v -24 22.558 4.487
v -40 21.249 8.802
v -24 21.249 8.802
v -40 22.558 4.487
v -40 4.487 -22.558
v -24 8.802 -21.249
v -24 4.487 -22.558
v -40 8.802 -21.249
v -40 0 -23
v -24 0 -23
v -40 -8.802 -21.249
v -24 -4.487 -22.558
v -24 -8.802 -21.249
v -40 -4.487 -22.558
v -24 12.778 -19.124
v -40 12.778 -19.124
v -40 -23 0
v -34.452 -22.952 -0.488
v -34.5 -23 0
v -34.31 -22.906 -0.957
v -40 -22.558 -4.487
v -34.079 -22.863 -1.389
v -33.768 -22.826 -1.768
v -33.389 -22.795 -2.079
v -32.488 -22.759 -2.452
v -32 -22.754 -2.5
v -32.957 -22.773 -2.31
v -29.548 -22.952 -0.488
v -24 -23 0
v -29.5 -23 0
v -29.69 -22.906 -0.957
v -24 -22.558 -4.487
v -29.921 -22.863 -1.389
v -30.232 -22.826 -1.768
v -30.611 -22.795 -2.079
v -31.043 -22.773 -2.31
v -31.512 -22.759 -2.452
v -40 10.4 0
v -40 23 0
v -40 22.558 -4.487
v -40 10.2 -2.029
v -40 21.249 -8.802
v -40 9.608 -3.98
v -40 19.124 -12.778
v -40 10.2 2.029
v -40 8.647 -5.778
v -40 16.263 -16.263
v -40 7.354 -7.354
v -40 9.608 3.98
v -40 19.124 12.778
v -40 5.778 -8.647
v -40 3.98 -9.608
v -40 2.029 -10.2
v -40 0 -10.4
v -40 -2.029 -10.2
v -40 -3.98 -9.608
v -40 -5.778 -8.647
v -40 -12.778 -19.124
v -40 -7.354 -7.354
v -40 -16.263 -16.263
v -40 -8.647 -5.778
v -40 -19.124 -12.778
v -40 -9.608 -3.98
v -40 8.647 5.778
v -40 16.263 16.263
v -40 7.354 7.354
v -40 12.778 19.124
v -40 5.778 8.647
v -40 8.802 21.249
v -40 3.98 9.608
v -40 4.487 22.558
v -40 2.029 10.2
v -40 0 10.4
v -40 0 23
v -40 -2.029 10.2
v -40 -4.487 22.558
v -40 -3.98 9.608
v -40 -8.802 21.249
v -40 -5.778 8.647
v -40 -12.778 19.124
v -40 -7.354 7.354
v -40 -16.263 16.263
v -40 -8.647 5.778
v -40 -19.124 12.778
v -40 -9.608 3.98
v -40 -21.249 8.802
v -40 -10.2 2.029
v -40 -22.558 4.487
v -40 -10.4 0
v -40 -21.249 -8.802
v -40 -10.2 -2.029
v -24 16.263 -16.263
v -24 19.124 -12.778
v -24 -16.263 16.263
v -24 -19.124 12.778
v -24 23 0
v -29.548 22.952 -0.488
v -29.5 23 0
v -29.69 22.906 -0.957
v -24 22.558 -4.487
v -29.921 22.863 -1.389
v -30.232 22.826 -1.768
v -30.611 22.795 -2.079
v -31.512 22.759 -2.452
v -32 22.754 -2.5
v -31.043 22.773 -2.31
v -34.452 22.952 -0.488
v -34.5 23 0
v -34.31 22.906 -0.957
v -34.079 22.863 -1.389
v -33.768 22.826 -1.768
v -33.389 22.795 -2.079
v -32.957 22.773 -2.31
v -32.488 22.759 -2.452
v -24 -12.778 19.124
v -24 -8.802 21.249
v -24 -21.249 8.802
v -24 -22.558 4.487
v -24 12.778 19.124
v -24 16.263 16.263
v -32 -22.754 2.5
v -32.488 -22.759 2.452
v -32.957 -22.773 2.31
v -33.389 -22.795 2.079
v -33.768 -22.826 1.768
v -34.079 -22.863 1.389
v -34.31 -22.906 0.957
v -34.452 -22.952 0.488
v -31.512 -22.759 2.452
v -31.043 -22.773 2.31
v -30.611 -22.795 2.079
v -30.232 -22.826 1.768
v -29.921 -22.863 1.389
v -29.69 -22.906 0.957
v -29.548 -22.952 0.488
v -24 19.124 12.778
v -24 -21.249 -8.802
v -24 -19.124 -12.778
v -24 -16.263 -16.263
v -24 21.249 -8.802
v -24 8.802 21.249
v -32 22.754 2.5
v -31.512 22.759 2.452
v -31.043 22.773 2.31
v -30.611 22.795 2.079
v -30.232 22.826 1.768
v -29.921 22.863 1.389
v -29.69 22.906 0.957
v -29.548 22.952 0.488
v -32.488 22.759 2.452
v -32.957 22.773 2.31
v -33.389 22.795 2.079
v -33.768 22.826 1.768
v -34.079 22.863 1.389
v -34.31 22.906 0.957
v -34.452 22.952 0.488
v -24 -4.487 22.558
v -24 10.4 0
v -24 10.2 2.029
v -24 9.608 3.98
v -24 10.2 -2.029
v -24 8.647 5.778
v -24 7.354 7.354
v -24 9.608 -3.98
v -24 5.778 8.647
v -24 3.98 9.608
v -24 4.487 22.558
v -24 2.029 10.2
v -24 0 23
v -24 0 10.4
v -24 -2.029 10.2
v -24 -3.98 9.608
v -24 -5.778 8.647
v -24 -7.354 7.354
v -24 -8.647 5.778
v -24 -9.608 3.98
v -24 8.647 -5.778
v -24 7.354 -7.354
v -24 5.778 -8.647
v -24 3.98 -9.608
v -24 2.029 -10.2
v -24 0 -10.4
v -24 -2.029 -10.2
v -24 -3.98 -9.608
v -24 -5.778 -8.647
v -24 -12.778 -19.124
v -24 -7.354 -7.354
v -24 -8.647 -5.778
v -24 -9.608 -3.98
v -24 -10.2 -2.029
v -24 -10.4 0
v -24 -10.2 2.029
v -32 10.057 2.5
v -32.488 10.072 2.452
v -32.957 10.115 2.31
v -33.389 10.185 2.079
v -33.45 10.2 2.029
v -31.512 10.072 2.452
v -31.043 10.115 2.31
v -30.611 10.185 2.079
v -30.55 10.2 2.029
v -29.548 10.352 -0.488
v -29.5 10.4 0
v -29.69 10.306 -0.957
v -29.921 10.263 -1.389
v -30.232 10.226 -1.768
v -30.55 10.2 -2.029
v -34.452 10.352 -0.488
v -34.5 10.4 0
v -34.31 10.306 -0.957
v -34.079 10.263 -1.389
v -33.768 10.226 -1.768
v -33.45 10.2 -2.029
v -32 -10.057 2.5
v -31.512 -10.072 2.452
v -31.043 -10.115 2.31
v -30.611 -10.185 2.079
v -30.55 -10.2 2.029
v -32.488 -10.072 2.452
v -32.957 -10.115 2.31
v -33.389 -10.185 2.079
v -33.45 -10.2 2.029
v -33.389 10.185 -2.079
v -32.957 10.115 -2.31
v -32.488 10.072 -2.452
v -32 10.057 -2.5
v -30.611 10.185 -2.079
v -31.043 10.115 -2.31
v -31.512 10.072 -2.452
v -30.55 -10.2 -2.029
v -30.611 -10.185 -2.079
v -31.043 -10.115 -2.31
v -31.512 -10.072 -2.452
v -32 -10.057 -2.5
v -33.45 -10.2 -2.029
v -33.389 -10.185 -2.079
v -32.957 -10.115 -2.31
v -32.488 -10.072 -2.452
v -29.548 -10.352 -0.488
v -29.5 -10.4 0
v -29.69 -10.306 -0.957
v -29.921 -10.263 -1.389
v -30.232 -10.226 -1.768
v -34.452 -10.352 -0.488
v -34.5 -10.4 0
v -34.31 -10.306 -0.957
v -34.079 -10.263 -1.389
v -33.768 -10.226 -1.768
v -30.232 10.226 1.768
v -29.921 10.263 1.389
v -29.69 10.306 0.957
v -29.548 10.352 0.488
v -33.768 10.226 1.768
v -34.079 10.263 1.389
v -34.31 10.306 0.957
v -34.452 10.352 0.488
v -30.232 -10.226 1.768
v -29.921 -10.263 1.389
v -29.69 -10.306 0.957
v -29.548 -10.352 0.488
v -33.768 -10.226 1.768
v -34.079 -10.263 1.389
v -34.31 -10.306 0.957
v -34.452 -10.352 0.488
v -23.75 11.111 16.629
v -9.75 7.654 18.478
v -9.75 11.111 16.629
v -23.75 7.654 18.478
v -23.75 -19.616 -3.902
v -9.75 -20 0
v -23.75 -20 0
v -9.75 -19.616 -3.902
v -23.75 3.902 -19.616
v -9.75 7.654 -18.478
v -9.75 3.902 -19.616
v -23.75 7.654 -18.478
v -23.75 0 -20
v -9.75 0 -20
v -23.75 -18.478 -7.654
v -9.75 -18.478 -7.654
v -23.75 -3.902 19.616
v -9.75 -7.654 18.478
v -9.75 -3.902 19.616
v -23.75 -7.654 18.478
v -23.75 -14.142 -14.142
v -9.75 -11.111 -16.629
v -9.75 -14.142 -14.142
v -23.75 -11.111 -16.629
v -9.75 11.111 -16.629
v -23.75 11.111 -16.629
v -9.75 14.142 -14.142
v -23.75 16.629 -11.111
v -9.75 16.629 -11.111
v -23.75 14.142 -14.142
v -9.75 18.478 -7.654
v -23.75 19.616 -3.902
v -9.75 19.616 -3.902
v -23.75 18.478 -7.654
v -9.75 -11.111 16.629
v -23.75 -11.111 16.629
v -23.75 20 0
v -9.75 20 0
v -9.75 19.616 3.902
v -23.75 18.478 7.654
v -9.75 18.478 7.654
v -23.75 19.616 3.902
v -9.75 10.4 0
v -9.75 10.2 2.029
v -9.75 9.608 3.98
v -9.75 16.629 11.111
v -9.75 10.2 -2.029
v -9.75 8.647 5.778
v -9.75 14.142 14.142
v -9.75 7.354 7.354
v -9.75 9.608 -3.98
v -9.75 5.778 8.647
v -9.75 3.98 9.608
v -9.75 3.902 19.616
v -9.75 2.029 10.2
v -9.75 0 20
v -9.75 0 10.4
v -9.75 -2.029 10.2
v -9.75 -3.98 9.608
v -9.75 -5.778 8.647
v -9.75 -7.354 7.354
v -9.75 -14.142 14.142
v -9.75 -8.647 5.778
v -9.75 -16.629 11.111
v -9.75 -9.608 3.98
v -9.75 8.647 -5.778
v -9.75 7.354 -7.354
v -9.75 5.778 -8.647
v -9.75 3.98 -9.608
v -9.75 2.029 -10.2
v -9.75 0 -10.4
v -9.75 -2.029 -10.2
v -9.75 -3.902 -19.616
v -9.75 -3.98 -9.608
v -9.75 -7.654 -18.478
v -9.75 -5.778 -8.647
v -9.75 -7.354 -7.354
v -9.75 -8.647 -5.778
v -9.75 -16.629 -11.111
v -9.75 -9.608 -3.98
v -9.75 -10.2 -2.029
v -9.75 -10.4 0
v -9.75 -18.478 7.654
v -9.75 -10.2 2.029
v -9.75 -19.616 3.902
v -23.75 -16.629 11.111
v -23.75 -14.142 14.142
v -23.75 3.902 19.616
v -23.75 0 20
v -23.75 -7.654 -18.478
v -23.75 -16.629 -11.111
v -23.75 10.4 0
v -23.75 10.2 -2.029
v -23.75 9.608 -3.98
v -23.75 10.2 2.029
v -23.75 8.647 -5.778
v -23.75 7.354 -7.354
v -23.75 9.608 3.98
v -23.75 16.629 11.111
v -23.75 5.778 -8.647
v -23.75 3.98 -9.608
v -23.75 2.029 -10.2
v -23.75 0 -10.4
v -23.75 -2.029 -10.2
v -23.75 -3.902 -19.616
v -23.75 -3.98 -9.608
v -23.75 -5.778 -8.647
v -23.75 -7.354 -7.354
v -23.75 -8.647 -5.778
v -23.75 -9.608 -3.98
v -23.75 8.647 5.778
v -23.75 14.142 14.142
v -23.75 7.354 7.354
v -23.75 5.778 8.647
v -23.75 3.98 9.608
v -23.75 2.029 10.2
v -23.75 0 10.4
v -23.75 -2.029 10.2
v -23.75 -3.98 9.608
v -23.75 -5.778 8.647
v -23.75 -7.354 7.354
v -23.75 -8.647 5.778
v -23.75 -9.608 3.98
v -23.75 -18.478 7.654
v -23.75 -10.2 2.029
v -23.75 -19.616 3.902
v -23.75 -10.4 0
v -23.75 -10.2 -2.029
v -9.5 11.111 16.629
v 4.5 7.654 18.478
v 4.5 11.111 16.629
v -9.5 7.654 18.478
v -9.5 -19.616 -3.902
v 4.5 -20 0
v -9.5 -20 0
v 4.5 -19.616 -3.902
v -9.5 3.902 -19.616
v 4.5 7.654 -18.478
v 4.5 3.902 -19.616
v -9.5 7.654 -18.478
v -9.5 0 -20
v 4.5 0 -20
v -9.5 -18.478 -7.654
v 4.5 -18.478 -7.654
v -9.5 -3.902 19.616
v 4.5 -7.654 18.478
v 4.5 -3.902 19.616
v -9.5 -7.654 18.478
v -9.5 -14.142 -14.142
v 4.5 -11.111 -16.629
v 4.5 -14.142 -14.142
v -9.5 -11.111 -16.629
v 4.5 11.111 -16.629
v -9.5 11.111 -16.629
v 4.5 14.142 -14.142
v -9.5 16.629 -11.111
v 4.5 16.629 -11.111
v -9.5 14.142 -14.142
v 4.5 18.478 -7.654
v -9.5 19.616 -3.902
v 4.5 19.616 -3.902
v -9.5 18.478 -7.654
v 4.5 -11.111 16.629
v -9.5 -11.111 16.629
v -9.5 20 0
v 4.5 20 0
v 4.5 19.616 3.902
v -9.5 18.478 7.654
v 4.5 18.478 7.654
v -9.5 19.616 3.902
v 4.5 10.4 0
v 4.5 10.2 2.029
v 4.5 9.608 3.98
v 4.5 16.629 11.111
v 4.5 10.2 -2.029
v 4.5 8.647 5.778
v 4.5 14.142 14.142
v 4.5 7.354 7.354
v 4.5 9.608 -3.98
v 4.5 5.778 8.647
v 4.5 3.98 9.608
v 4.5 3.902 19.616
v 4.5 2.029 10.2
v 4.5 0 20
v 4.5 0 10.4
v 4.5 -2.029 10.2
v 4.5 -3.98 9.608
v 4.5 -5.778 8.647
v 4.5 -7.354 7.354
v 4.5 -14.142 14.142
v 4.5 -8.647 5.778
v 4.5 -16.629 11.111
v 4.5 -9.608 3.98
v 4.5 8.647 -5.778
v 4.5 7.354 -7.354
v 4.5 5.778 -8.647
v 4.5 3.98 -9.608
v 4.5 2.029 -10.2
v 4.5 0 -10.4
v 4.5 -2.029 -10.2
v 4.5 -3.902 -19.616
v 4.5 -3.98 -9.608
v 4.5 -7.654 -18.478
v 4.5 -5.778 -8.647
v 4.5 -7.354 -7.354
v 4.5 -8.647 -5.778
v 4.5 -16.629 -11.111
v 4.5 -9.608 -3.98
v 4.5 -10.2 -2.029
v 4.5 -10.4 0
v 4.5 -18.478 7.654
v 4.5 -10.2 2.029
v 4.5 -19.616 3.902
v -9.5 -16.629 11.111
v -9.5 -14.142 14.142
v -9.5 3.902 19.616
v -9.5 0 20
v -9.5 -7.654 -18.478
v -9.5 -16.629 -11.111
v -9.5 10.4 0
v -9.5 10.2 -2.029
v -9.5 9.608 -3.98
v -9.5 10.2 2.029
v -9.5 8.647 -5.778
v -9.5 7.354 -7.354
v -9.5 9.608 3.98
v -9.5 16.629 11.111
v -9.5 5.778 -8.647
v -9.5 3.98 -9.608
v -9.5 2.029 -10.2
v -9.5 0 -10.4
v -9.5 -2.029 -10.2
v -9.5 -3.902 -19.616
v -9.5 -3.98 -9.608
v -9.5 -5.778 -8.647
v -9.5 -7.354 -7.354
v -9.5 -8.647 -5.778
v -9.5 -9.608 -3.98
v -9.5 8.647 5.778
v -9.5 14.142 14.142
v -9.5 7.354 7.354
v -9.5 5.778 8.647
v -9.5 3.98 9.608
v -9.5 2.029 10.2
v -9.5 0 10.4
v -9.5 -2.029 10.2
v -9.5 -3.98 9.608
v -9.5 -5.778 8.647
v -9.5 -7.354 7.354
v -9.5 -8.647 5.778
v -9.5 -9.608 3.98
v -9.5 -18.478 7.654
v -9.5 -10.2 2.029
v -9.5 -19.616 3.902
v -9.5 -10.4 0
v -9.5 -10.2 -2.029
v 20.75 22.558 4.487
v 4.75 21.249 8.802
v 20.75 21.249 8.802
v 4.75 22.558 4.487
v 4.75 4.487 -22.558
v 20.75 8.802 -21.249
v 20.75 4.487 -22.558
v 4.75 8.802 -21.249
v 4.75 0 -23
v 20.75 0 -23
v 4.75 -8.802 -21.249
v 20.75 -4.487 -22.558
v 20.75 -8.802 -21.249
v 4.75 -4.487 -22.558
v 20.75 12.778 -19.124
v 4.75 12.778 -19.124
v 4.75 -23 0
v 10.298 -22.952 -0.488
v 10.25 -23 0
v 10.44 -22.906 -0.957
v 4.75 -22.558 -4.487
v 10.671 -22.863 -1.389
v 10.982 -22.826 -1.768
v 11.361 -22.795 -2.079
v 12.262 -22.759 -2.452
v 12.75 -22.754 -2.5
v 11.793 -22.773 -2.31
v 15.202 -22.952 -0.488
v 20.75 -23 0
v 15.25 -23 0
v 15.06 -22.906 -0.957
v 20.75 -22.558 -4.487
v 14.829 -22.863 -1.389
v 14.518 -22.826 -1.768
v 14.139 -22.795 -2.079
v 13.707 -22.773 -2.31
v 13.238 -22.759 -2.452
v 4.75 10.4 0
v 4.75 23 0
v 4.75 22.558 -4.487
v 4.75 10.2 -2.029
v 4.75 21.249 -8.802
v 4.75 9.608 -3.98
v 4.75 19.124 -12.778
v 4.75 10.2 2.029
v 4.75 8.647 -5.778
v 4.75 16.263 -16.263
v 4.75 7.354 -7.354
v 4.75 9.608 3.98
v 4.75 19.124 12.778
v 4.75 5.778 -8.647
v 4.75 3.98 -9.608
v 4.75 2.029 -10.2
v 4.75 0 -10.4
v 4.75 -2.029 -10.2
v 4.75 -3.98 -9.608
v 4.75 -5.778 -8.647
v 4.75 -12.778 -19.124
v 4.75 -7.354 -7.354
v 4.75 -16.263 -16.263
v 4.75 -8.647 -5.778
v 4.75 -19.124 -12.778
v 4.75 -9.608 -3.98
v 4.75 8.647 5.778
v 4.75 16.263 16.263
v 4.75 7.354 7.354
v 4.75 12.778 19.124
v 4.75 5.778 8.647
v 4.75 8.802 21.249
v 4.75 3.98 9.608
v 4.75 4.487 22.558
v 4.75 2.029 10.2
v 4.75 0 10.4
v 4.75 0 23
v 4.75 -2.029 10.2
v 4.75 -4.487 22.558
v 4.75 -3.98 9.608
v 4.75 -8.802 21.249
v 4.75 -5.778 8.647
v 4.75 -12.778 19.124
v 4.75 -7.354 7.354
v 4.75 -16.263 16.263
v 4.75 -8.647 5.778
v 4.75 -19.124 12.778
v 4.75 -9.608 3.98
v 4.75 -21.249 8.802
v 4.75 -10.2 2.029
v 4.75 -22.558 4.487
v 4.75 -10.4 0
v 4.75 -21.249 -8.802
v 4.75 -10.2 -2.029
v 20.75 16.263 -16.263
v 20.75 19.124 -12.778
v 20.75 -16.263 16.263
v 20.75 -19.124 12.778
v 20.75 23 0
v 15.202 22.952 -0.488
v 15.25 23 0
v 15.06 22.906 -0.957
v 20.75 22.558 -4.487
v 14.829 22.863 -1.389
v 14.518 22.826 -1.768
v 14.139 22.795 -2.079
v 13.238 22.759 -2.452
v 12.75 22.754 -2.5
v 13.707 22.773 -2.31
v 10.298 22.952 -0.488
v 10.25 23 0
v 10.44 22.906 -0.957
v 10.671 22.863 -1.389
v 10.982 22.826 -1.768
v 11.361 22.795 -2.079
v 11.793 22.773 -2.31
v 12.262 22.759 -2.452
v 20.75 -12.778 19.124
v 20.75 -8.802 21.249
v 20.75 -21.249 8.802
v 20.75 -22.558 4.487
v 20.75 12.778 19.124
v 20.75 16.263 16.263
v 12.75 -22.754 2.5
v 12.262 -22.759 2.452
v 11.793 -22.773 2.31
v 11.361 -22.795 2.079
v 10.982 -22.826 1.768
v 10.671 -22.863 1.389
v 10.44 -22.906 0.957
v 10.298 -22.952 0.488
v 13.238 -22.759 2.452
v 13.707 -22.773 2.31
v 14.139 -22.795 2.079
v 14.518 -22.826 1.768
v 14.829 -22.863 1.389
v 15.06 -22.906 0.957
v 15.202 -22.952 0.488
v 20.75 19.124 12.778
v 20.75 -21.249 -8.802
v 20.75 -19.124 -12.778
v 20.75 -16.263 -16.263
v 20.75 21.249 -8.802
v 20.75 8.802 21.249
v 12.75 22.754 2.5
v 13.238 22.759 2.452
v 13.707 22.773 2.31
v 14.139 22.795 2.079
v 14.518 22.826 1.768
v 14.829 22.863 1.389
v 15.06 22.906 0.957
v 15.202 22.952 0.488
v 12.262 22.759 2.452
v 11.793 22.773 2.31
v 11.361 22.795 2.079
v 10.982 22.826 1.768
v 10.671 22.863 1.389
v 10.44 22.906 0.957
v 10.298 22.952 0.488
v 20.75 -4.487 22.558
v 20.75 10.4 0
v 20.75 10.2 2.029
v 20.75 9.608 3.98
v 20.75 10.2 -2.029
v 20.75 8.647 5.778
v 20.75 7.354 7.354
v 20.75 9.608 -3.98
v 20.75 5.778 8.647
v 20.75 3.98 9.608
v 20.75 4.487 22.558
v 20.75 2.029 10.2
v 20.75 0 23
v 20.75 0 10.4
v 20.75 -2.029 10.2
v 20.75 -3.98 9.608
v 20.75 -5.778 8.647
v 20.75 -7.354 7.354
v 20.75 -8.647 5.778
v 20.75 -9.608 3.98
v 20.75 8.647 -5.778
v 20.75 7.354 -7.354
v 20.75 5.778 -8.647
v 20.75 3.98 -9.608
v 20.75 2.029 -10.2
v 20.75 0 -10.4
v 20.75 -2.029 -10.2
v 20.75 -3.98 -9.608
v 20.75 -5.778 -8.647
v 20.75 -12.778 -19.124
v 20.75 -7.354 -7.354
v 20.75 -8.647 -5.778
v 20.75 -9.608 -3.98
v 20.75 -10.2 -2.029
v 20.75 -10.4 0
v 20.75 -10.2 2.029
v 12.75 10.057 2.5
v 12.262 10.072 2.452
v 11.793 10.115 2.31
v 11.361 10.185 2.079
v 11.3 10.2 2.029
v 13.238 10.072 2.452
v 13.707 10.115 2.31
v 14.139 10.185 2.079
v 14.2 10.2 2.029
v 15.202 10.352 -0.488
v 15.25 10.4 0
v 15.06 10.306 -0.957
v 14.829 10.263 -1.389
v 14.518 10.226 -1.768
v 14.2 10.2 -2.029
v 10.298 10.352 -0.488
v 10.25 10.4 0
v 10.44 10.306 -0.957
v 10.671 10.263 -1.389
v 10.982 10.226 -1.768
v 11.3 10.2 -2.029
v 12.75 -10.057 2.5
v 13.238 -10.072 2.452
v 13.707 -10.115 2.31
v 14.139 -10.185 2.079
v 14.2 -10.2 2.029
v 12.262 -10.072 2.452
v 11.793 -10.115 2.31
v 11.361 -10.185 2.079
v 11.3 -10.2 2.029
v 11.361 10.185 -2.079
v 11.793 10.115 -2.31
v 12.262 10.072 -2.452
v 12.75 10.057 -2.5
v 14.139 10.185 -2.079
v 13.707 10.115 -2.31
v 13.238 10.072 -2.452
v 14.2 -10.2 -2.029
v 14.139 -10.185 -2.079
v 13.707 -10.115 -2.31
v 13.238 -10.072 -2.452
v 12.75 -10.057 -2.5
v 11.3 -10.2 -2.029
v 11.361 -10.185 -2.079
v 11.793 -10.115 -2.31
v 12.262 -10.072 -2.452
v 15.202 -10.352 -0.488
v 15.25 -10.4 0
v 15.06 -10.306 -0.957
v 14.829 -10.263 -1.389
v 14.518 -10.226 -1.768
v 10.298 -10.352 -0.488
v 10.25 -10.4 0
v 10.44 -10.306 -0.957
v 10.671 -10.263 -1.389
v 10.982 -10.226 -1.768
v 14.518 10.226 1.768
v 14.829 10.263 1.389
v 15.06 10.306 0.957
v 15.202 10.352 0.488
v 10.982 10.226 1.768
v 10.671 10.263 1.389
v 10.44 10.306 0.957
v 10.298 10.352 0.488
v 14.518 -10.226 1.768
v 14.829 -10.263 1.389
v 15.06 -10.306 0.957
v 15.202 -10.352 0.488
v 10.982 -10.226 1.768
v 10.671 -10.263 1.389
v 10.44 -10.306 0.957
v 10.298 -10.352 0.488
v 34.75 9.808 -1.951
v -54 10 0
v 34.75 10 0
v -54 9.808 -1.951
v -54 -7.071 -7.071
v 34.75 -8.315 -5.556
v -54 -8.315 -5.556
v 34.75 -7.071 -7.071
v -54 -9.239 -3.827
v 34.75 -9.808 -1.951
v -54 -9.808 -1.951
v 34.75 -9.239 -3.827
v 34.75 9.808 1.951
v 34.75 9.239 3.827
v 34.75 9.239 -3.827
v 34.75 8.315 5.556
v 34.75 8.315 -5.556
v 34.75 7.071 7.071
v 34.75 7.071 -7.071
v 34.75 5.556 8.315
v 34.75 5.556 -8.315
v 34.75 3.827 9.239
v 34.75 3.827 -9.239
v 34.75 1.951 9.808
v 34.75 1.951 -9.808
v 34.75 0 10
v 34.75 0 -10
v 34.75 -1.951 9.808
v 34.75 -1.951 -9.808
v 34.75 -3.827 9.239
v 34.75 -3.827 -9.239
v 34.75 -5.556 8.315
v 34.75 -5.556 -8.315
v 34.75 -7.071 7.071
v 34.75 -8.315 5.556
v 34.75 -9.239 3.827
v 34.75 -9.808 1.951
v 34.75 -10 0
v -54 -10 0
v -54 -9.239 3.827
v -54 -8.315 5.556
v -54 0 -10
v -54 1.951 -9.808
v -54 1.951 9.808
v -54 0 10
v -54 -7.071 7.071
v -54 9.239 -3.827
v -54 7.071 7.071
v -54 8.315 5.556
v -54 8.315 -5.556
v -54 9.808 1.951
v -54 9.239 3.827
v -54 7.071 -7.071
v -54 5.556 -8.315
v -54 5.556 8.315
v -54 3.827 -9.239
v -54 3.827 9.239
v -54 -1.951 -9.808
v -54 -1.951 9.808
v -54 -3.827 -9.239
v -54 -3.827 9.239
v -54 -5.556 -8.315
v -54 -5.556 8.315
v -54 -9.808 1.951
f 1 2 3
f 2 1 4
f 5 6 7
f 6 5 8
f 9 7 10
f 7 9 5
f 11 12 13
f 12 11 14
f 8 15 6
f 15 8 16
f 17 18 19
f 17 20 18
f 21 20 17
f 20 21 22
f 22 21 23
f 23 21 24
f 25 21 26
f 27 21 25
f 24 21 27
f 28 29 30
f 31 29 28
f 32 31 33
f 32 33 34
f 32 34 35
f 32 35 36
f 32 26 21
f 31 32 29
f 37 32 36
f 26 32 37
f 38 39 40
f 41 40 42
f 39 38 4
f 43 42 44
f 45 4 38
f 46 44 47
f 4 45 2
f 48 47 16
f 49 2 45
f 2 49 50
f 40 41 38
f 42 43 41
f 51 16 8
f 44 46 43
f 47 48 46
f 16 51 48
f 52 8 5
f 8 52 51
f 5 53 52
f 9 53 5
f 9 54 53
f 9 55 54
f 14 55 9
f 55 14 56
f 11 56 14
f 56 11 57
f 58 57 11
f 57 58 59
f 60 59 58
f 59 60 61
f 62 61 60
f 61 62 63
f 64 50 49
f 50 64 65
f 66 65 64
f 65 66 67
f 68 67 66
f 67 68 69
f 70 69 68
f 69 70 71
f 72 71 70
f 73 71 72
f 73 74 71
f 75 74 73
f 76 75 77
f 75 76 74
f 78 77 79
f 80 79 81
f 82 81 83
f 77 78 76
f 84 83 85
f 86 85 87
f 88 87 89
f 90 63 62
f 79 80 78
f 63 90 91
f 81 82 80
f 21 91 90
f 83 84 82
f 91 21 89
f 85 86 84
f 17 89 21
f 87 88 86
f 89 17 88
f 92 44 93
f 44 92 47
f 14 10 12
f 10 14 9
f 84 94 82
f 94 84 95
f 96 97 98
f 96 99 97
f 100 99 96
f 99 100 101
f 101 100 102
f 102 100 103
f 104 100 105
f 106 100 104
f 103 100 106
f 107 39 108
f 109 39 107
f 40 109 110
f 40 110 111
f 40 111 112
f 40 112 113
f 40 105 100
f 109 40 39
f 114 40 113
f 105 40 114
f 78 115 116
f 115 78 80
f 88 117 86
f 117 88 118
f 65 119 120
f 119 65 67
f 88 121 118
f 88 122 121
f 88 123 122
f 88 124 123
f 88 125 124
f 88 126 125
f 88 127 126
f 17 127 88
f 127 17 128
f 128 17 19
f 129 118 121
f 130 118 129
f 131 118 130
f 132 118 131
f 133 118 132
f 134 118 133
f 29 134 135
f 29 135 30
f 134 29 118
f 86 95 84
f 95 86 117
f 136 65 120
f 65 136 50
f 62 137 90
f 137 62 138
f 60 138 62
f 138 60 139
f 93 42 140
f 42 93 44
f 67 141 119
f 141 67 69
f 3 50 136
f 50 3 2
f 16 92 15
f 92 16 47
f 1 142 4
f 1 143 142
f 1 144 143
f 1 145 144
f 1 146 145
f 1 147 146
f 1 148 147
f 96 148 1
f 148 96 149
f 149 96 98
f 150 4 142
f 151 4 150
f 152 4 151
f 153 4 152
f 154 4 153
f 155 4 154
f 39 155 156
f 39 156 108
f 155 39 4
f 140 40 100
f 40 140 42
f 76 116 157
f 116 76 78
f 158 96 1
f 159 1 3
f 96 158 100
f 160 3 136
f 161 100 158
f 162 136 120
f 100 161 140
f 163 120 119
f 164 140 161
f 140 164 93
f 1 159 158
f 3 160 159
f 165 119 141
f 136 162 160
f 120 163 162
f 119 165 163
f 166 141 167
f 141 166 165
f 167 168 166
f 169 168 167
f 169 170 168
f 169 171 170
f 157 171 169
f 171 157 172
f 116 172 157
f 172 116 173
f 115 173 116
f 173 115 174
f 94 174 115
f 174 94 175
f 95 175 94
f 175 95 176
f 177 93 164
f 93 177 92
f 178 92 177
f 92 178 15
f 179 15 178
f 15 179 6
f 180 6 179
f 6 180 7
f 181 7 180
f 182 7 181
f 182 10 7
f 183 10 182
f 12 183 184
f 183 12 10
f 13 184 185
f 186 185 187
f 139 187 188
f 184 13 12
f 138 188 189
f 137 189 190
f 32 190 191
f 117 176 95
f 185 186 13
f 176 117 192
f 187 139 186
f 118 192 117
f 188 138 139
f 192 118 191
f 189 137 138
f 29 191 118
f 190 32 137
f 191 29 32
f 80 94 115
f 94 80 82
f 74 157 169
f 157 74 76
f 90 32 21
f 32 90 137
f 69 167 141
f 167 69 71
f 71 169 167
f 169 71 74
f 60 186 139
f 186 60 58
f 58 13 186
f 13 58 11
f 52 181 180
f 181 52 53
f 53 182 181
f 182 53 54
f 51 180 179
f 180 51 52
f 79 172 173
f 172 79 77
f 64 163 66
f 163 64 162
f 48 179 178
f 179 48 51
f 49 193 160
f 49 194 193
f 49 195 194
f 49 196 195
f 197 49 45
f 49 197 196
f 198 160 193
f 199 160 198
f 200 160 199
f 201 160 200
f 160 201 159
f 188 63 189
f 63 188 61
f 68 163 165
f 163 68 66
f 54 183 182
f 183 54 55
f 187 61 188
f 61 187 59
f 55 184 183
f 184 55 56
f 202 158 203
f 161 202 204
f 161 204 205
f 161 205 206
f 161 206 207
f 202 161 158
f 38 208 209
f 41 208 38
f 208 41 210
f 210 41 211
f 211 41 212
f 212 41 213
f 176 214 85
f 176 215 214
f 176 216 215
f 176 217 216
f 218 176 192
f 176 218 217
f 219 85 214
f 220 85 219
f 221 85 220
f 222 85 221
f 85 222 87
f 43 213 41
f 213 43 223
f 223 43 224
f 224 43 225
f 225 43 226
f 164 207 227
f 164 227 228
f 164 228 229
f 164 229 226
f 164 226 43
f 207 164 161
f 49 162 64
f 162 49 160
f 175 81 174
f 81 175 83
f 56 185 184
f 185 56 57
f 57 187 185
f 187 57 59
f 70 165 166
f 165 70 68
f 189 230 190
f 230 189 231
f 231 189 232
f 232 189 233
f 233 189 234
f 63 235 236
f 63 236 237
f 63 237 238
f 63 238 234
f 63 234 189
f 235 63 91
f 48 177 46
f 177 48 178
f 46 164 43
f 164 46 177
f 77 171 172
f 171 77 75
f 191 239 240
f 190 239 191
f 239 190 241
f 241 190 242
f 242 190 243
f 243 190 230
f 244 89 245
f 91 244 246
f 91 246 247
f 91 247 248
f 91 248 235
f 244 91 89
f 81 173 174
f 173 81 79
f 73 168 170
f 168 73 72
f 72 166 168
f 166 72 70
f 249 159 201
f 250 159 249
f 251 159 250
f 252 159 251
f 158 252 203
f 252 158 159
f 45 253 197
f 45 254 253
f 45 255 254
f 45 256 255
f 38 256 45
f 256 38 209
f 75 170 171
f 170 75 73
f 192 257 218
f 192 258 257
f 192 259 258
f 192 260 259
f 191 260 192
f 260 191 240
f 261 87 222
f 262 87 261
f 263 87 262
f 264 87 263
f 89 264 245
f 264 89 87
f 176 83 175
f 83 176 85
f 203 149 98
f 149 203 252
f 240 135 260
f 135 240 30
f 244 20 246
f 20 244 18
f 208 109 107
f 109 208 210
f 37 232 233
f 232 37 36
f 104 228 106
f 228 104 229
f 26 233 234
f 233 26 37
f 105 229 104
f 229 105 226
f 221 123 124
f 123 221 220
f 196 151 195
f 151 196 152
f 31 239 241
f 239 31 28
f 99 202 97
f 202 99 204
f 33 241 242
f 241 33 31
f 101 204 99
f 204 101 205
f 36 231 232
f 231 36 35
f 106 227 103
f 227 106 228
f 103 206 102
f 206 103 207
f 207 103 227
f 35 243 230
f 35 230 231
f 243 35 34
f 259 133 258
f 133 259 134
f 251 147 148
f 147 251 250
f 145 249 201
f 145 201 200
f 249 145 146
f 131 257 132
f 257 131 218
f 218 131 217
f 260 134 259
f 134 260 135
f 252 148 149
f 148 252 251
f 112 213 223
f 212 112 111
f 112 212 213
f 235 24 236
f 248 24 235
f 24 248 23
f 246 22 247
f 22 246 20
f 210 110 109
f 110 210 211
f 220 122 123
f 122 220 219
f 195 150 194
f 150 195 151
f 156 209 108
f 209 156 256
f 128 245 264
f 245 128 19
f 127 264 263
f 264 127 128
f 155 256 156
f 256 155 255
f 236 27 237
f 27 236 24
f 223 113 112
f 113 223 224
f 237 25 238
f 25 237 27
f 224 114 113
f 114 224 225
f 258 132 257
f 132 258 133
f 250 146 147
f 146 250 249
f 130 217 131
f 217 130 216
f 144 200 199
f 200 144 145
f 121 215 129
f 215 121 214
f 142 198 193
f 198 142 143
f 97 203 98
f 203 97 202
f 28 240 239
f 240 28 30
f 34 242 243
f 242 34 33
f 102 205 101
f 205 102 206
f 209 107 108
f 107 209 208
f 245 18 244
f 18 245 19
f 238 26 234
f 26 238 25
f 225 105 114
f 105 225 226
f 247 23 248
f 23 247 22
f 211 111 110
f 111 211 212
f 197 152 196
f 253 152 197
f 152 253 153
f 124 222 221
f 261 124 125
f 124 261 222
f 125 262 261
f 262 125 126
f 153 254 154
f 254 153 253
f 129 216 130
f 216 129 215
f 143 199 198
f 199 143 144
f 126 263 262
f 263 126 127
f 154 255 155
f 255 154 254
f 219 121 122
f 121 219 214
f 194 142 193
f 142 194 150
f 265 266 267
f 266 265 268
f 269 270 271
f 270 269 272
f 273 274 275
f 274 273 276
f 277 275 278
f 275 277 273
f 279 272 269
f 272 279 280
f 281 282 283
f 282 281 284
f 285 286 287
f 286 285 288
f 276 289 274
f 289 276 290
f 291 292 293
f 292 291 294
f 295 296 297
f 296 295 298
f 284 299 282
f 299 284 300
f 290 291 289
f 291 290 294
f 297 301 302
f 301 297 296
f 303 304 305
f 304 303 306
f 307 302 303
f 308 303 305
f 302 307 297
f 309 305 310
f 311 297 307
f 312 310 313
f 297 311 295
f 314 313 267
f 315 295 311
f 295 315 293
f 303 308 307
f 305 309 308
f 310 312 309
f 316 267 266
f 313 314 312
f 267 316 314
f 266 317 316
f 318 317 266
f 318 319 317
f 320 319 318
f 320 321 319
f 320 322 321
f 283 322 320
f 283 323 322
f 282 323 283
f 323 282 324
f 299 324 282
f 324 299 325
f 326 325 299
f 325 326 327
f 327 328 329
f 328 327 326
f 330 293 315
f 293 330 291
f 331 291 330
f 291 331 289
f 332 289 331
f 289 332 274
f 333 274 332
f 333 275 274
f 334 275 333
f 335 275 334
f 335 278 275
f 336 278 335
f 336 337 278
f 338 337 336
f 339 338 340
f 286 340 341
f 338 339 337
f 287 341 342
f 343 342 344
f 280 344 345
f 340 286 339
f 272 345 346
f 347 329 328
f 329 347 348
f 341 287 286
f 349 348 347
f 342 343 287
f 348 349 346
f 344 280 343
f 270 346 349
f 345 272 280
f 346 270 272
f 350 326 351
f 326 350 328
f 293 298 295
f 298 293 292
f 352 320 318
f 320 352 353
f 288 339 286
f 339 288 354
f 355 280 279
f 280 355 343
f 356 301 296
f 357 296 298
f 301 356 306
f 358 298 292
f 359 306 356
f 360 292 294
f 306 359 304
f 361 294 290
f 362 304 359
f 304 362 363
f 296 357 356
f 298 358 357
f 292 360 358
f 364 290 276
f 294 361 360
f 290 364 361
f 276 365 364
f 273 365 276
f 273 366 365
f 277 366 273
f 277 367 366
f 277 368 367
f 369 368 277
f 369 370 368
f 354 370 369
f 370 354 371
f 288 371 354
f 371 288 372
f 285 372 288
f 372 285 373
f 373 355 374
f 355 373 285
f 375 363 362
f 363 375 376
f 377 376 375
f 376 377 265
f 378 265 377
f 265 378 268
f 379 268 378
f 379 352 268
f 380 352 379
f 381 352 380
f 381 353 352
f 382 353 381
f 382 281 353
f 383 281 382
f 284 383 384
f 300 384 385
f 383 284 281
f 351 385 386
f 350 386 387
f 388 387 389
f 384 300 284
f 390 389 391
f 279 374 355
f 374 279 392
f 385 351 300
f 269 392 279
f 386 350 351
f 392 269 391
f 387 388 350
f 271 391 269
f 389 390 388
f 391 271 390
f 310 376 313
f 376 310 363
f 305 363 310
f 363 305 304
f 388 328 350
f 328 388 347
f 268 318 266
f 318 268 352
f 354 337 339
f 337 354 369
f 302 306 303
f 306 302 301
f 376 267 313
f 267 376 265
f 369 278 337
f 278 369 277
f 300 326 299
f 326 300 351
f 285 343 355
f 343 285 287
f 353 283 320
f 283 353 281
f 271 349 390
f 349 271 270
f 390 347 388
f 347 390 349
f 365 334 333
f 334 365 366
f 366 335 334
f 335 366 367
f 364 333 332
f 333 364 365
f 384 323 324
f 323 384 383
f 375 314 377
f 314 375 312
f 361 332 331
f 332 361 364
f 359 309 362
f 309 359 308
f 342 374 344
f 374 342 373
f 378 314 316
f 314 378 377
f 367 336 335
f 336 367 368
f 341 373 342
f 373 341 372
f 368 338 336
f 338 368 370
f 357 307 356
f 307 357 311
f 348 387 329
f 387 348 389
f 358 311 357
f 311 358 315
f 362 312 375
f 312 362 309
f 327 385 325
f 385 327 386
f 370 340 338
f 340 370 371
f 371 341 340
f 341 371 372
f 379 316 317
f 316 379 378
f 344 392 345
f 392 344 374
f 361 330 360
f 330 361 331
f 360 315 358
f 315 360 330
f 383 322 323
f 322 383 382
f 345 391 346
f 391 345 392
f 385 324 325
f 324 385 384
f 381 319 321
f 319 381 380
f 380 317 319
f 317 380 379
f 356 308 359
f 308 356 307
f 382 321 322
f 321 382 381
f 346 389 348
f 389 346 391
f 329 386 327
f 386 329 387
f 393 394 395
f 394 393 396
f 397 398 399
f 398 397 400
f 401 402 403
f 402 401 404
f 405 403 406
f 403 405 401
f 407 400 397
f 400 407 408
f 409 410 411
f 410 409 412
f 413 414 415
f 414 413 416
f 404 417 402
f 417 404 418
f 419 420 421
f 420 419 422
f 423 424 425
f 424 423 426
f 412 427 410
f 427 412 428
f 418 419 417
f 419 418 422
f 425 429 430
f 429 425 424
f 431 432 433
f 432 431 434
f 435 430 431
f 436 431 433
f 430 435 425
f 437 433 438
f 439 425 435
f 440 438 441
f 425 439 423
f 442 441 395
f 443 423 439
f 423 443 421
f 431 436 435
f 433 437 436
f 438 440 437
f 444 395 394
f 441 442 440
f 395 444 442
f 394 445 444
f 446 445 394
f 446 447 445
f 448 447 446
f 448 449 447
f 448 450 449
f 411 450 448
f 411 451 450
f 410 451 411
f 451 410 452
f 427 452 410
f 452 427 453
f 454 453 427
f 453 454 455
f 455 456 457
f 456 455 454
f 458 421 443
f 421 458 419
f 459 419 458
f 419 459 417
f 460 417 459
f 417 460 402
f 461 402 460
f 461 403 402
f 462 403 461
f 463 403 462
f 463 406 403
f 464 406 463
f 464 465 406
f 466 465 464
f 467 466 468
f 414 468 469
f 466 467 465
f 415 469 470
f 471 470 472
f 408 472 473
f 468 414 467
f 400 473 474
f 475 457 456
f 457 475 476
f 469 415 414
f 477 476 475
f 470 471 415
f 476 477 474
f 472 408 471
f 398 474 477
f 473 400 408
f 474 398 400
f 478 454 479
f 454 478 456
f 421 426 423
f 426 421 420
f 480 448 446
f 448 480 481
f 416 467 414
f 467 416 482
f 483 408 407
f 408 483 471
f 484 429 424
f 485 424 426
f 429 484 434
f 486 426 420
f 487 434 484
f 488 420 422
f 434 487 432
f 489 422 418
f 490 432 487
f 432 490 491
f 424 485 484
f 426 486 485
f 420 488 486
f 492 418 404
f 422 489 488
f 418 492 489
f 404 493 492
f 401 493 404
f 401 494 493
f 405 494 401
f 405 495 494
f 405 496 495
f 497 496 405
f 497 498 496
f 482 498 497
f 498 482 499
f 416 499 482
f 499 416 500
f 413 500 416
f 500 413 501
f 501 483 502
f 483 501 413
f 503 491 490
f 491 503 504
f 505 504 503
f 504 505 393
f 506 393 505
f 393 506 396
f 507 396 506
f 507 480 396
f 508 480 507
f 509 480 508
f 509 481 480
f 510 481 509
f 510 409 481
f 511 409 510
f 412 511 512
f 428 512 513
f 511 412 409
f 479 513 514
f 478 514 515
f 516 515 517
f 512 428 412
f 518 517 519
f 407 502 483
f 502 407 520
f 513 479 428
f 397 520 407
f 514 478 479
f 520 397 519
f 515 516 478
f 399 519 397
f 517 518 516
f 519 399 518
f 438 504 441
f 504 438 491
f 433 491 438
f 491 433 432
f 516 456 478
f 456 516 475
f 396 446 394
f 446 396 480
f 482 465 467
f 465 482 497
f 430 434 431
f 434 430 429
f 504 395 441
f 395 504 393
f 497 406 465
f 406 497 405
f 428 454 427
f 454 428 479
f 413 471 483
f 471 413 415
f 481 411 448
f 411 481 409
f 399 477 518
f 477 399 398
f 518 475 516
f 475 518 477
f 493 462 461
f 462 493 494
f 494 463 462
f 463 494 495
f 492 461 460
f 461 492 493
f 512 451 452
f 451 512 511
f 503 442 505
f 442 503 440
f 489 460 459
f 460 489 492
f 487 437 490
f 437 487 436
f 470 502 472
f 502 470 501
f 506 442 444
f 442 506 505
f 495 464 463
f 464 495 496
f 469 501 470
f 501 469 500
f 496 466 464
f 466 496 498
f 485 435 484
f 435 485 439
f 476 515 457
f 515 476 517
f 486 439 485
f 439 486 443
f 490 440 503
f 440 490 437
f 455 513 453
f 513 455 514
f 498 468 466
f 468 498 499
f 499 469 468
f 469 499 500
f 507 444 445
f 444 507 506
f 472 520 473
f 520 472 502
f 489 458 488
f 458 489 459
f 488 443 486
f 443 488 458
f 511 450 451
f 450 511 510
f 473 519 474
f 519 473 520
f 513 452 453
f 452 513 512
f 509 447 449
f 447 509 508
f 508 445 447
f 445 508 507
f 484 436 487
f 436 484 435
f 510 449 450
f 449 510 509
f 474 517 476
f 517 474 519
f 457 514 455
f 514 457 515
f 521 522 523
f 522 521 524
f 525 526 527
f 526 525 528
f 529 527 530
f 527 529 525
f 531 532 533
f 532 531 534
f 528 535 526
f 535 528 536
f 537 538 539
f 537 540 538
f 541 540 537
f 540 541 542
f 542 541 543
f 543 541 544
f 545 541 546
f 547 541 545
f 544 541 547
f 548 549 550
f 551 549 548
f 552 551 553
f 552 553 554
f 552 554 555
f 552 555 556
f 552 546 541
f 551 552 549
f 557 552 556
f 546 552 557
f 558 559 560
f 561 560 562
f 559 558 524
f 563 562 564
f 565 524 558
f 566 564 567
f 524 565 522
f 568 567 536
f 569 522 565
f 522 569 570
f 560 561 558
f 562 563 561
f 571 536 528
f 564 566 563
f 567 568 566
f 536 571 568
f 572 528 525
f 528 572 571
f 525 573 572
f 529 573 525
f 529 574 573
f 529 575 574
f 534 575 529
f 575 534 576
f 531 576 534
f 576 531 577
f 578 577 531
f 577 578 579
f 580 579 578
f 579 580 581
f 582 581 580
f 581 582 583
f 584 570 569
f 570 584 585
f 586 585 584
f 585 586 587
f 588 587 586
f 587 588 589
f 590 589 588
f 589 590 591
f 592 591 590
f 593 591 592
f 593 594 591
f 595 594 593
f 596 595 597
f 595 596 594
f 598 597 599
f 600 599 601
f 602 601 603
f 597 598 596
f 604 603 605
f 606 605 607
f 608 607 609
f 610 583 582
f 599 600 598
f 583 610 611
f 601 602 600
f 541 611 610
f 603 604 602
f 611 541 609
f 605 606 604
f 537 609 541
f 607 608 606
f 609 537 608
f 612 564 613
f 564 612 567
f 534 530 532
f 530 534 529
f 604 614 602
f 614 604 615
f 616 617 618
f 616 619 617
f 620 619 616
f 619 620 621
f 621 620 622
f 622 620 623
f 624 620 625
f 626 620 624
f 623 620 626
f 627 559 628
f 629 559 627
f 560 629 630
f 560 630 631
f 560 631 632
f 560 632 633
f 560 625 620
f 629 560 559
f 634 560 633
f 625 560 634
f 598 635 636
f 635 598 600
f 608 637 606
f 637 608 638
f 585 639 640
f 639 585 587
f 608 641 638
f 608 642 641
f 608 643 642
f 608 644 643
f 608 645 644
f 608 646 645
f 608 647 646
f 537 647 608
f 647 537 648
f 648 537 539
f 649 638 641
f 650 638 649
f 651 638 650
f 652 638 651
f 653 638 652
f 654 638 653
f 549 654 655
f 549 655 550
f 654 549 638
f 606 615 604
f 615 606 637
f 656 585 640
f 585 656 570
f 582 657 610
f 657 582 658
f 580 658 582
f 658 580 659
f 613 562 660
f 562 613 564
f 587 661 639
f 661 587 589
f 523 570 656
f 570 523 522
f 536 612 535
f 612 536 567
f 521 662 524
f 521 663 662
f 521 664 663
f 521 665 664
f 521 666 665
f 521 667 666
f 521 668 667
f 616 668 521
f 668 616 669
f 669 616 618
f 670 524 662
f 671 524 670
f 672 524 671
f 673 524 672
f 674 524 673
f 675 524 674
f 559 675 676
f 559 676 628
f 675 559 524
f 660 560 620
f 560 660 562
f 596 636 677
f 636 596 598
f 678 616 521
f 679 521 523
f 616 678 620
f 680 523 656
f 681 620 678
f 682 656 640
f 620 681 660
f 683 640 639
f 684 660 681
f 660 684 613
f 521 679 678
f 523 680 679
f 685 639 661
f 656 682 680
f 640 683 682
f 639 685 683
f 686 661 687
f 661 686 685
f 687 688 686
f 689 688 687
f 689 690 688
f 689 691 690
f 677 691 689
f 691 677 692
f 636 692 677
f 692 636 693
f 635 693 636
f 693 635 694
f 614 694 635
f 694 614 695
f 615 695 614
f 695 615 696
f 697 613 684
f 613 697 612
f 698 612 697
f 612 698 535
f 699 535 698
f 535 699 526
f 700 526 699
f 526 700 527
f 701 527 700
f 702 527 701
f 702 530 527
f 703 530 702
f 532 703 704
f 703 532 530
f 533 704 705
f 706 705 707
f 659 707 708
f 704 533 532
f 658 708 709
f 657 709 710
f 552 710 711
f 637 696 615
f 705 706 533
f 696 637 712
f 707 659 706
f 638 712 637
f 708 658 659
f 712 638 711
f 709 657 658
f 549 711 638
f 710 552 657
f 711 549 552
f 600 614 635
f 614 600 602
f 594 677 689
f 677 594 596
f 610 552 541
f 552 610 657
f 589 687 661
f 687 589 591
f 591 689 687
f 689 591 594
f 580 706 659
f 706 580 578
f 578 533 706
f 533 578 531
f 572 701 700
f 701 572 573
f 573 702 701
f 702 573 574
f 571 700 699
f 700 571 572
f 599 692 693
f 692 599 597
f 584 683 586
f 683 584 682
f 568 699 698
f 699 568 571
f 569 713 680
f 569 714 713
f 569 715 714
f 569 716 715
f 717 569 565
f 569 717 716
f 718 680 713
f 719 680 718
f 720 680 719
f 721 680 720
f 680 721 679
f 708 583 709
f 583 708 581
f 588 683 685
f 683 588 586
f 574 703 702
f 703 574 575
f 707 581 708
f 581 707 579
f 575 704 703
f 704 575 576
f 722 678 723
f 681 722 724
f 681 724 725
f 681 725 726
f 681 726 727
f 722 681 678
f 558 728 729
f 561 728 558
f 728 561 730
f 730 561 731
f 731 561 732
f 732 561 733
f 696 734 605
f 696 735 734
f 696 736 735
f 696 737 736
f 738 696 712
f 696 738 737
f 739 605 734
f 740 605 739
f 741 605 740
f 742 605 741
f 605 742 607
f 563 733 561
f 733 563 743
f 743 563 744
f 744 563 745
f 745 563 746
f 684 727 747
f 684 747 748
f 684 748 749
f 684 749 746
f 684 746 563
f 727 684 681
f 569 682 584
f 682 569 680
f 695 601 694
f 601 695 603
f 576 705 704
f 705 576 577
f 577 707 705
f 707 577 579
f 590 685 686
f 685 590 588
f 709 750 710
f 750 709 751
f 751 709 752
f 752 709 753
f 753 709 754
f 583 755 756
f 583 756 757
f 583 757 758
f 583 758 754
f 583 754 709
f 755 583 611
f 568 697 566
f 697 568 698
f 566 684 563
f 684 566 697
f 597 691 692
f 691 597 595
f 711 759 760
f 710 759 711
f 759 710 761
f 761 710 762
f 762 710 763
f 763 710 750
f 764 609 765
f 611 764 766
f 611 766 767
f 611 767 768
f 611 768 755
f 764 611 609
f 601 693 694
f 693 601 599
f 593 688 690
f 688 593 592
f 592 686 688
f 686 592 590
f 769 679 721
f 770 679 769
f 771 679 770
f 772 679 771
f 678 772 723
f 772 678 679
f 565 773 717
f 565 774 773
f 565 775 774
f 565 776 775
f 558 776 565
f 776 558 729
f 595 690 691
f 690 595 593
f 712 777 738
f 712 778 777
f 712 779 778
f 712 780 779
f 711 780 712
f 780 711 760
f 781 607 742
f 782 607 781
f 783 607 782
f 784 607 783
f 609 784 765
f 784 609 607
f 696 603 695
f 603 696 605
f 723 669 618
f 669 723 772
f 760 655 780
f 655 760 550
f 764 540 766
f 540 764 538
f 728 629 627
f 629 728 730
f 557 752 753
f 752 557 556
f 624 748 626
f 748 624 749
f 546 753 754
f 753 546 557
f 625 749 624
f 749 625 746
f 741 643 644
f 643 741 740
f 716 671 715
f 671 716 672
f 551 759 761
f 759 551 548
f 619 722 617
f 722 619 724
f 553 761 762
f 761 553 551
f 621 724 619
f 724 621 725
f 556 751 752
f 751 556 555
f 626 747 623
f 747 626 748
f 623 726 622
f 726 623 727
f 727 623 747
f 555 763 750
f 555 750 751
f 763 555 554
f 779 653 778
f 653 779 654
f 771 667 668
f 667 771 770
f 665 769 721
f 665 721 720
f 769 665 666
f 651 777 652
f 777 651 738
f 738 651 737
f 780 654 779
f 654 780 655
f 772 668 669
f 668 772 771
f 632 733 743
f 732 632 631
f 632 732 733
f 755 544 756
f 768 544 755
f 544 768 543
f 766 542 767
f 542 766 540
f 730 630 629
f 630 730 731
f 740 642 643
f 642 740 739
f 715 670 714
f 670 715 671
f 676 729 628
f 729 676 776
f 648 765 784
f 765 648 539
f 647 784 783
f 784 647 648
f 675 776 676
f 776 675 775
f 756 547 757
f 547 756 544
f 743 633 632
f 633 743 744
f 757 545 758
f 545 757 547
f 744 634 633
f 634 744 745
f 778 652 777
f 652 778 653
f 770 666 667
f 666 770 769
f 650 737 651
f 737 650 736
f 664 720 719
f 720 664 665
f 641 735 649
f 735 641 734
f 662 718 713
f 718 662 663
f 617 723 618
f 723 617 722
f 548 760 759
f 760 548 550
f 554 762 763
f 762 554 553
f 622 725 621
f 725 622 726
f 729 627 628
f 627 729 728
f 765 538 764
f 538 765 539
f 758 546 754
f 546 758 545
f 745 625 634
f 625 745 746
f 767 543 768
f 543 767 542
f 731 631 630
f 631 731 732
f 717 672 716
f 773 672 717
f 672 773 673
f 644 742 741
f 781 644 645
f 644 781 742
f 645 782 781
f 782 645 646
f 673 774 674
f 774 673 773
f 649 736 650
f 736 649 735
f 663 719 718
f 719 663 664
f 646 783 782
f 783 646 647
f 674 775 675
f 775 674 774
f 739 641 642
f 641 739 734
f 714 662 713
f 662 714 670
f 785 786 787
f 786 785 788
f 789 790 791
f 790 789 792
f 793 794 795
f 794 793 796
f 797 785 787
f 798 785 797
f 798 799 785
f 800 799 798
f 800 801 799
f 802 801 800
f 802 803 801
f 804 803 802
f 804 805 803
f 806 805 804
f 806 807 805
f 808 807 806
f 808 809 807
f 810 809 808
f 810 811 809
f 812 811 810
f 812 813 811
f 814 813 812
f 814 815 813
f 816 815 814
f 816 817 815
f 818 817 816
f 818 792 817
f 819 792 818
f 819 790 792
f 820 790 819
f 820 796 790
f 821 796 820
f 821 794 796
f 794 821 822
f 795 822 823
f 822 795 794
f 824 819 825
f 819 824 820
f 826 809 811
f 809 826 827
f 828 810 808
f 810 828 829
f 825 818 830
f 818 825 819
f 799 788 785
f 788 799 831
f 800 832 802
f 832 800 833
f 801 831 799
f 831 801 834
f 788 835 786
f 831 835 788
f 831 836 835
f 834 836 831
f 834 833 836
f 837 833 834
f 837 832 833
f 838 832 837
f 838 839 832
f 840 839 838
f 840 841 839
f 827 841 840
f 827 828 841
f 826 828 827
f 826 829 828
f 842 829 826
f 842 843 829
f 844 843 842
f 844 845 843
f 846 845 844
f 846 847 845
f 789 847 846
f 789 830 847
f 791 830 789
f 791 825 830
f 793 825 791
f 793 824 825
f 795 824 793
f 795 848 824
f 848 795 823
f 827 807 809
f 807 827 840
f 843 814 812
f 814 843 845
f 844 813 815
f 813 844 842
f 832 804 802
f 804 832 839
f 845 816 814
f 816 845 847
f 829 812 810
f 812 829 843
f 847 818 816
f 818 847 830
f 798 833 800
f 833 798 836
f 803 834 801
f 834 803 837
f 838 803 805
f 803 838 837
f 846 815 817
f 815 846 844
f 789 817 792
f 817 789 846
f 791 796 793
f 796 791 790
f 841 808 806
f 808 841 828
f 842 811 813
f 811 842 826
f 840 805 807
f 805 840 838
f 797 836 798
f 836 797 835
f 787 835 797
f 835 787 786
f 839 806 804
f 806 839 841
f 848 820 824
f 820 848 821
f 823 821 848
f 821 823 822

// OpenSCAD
$fn = 32;

// ------------------------------------------------------------------------
// Shaft with rings and collars: d20 shaft, 4 rings
// Every part is its own module, assembly() places them once.
// ------------------------------------------------------------------------

// --- part 1 ---
module shaft() {
  translate([0, 0, -44.375]) cylinder(h = 88.75, d = 20);
}

// --- part 2 ---
module collar_a() {
  difference() {
    cylinder(h = 16, d = 46);
    translate([0, 0, -1]) cylinder(h = 18, d = 20.8);
    translate([0, 0, 8]) rotate([90, 0, 0]) cylinder(h = 48, d = 5, center = true);
  }
}

// --- part 3 ---
module spacer_a() {
  difference() {
      translate([0, 0, 0]) cylinder(h = 14, d = 40);
      translate([0, 0, -1]) cylinder(h = 16, d = 20.8);
    }
}

// --- part 4 ---
module spacer_b() {
  difference() {
      translate([0, 0, 0]) cylinder(h = 14, d = 40);
      translate([0, 0, -1]) cylinder(h = 16, d = 20.8);
    }
}

// --- part 5 ---
module collar_b() {
  difference() {
    cylinder(h = 16, d = 46);
    translate([0, 0, -1]) cylinder(h = 18, d = 20.8);
    translate([0, 0, 8]) rotate([90, 0, 0]) cylinder(h = 48, d = 5, center = true);
  }
}

// --- assembly ---
module assembly() {
  translate([-9.625, 0, 0]) rotate([0, 90, 0]) shaft();
  translate([-40, 0, 0]) rotate([0, 90, 0]) collar_a();
  translate([-23.75, 0, 0]) rotate([0, 90, 0]) spacer_a();
  translate([-9.5, 0, 0]) rotate([0, 90, 0]) spacer_b();
  translate([4.75, 0, 0]) rotate([0, 90, 0]) collar_b();
}

assembly();
